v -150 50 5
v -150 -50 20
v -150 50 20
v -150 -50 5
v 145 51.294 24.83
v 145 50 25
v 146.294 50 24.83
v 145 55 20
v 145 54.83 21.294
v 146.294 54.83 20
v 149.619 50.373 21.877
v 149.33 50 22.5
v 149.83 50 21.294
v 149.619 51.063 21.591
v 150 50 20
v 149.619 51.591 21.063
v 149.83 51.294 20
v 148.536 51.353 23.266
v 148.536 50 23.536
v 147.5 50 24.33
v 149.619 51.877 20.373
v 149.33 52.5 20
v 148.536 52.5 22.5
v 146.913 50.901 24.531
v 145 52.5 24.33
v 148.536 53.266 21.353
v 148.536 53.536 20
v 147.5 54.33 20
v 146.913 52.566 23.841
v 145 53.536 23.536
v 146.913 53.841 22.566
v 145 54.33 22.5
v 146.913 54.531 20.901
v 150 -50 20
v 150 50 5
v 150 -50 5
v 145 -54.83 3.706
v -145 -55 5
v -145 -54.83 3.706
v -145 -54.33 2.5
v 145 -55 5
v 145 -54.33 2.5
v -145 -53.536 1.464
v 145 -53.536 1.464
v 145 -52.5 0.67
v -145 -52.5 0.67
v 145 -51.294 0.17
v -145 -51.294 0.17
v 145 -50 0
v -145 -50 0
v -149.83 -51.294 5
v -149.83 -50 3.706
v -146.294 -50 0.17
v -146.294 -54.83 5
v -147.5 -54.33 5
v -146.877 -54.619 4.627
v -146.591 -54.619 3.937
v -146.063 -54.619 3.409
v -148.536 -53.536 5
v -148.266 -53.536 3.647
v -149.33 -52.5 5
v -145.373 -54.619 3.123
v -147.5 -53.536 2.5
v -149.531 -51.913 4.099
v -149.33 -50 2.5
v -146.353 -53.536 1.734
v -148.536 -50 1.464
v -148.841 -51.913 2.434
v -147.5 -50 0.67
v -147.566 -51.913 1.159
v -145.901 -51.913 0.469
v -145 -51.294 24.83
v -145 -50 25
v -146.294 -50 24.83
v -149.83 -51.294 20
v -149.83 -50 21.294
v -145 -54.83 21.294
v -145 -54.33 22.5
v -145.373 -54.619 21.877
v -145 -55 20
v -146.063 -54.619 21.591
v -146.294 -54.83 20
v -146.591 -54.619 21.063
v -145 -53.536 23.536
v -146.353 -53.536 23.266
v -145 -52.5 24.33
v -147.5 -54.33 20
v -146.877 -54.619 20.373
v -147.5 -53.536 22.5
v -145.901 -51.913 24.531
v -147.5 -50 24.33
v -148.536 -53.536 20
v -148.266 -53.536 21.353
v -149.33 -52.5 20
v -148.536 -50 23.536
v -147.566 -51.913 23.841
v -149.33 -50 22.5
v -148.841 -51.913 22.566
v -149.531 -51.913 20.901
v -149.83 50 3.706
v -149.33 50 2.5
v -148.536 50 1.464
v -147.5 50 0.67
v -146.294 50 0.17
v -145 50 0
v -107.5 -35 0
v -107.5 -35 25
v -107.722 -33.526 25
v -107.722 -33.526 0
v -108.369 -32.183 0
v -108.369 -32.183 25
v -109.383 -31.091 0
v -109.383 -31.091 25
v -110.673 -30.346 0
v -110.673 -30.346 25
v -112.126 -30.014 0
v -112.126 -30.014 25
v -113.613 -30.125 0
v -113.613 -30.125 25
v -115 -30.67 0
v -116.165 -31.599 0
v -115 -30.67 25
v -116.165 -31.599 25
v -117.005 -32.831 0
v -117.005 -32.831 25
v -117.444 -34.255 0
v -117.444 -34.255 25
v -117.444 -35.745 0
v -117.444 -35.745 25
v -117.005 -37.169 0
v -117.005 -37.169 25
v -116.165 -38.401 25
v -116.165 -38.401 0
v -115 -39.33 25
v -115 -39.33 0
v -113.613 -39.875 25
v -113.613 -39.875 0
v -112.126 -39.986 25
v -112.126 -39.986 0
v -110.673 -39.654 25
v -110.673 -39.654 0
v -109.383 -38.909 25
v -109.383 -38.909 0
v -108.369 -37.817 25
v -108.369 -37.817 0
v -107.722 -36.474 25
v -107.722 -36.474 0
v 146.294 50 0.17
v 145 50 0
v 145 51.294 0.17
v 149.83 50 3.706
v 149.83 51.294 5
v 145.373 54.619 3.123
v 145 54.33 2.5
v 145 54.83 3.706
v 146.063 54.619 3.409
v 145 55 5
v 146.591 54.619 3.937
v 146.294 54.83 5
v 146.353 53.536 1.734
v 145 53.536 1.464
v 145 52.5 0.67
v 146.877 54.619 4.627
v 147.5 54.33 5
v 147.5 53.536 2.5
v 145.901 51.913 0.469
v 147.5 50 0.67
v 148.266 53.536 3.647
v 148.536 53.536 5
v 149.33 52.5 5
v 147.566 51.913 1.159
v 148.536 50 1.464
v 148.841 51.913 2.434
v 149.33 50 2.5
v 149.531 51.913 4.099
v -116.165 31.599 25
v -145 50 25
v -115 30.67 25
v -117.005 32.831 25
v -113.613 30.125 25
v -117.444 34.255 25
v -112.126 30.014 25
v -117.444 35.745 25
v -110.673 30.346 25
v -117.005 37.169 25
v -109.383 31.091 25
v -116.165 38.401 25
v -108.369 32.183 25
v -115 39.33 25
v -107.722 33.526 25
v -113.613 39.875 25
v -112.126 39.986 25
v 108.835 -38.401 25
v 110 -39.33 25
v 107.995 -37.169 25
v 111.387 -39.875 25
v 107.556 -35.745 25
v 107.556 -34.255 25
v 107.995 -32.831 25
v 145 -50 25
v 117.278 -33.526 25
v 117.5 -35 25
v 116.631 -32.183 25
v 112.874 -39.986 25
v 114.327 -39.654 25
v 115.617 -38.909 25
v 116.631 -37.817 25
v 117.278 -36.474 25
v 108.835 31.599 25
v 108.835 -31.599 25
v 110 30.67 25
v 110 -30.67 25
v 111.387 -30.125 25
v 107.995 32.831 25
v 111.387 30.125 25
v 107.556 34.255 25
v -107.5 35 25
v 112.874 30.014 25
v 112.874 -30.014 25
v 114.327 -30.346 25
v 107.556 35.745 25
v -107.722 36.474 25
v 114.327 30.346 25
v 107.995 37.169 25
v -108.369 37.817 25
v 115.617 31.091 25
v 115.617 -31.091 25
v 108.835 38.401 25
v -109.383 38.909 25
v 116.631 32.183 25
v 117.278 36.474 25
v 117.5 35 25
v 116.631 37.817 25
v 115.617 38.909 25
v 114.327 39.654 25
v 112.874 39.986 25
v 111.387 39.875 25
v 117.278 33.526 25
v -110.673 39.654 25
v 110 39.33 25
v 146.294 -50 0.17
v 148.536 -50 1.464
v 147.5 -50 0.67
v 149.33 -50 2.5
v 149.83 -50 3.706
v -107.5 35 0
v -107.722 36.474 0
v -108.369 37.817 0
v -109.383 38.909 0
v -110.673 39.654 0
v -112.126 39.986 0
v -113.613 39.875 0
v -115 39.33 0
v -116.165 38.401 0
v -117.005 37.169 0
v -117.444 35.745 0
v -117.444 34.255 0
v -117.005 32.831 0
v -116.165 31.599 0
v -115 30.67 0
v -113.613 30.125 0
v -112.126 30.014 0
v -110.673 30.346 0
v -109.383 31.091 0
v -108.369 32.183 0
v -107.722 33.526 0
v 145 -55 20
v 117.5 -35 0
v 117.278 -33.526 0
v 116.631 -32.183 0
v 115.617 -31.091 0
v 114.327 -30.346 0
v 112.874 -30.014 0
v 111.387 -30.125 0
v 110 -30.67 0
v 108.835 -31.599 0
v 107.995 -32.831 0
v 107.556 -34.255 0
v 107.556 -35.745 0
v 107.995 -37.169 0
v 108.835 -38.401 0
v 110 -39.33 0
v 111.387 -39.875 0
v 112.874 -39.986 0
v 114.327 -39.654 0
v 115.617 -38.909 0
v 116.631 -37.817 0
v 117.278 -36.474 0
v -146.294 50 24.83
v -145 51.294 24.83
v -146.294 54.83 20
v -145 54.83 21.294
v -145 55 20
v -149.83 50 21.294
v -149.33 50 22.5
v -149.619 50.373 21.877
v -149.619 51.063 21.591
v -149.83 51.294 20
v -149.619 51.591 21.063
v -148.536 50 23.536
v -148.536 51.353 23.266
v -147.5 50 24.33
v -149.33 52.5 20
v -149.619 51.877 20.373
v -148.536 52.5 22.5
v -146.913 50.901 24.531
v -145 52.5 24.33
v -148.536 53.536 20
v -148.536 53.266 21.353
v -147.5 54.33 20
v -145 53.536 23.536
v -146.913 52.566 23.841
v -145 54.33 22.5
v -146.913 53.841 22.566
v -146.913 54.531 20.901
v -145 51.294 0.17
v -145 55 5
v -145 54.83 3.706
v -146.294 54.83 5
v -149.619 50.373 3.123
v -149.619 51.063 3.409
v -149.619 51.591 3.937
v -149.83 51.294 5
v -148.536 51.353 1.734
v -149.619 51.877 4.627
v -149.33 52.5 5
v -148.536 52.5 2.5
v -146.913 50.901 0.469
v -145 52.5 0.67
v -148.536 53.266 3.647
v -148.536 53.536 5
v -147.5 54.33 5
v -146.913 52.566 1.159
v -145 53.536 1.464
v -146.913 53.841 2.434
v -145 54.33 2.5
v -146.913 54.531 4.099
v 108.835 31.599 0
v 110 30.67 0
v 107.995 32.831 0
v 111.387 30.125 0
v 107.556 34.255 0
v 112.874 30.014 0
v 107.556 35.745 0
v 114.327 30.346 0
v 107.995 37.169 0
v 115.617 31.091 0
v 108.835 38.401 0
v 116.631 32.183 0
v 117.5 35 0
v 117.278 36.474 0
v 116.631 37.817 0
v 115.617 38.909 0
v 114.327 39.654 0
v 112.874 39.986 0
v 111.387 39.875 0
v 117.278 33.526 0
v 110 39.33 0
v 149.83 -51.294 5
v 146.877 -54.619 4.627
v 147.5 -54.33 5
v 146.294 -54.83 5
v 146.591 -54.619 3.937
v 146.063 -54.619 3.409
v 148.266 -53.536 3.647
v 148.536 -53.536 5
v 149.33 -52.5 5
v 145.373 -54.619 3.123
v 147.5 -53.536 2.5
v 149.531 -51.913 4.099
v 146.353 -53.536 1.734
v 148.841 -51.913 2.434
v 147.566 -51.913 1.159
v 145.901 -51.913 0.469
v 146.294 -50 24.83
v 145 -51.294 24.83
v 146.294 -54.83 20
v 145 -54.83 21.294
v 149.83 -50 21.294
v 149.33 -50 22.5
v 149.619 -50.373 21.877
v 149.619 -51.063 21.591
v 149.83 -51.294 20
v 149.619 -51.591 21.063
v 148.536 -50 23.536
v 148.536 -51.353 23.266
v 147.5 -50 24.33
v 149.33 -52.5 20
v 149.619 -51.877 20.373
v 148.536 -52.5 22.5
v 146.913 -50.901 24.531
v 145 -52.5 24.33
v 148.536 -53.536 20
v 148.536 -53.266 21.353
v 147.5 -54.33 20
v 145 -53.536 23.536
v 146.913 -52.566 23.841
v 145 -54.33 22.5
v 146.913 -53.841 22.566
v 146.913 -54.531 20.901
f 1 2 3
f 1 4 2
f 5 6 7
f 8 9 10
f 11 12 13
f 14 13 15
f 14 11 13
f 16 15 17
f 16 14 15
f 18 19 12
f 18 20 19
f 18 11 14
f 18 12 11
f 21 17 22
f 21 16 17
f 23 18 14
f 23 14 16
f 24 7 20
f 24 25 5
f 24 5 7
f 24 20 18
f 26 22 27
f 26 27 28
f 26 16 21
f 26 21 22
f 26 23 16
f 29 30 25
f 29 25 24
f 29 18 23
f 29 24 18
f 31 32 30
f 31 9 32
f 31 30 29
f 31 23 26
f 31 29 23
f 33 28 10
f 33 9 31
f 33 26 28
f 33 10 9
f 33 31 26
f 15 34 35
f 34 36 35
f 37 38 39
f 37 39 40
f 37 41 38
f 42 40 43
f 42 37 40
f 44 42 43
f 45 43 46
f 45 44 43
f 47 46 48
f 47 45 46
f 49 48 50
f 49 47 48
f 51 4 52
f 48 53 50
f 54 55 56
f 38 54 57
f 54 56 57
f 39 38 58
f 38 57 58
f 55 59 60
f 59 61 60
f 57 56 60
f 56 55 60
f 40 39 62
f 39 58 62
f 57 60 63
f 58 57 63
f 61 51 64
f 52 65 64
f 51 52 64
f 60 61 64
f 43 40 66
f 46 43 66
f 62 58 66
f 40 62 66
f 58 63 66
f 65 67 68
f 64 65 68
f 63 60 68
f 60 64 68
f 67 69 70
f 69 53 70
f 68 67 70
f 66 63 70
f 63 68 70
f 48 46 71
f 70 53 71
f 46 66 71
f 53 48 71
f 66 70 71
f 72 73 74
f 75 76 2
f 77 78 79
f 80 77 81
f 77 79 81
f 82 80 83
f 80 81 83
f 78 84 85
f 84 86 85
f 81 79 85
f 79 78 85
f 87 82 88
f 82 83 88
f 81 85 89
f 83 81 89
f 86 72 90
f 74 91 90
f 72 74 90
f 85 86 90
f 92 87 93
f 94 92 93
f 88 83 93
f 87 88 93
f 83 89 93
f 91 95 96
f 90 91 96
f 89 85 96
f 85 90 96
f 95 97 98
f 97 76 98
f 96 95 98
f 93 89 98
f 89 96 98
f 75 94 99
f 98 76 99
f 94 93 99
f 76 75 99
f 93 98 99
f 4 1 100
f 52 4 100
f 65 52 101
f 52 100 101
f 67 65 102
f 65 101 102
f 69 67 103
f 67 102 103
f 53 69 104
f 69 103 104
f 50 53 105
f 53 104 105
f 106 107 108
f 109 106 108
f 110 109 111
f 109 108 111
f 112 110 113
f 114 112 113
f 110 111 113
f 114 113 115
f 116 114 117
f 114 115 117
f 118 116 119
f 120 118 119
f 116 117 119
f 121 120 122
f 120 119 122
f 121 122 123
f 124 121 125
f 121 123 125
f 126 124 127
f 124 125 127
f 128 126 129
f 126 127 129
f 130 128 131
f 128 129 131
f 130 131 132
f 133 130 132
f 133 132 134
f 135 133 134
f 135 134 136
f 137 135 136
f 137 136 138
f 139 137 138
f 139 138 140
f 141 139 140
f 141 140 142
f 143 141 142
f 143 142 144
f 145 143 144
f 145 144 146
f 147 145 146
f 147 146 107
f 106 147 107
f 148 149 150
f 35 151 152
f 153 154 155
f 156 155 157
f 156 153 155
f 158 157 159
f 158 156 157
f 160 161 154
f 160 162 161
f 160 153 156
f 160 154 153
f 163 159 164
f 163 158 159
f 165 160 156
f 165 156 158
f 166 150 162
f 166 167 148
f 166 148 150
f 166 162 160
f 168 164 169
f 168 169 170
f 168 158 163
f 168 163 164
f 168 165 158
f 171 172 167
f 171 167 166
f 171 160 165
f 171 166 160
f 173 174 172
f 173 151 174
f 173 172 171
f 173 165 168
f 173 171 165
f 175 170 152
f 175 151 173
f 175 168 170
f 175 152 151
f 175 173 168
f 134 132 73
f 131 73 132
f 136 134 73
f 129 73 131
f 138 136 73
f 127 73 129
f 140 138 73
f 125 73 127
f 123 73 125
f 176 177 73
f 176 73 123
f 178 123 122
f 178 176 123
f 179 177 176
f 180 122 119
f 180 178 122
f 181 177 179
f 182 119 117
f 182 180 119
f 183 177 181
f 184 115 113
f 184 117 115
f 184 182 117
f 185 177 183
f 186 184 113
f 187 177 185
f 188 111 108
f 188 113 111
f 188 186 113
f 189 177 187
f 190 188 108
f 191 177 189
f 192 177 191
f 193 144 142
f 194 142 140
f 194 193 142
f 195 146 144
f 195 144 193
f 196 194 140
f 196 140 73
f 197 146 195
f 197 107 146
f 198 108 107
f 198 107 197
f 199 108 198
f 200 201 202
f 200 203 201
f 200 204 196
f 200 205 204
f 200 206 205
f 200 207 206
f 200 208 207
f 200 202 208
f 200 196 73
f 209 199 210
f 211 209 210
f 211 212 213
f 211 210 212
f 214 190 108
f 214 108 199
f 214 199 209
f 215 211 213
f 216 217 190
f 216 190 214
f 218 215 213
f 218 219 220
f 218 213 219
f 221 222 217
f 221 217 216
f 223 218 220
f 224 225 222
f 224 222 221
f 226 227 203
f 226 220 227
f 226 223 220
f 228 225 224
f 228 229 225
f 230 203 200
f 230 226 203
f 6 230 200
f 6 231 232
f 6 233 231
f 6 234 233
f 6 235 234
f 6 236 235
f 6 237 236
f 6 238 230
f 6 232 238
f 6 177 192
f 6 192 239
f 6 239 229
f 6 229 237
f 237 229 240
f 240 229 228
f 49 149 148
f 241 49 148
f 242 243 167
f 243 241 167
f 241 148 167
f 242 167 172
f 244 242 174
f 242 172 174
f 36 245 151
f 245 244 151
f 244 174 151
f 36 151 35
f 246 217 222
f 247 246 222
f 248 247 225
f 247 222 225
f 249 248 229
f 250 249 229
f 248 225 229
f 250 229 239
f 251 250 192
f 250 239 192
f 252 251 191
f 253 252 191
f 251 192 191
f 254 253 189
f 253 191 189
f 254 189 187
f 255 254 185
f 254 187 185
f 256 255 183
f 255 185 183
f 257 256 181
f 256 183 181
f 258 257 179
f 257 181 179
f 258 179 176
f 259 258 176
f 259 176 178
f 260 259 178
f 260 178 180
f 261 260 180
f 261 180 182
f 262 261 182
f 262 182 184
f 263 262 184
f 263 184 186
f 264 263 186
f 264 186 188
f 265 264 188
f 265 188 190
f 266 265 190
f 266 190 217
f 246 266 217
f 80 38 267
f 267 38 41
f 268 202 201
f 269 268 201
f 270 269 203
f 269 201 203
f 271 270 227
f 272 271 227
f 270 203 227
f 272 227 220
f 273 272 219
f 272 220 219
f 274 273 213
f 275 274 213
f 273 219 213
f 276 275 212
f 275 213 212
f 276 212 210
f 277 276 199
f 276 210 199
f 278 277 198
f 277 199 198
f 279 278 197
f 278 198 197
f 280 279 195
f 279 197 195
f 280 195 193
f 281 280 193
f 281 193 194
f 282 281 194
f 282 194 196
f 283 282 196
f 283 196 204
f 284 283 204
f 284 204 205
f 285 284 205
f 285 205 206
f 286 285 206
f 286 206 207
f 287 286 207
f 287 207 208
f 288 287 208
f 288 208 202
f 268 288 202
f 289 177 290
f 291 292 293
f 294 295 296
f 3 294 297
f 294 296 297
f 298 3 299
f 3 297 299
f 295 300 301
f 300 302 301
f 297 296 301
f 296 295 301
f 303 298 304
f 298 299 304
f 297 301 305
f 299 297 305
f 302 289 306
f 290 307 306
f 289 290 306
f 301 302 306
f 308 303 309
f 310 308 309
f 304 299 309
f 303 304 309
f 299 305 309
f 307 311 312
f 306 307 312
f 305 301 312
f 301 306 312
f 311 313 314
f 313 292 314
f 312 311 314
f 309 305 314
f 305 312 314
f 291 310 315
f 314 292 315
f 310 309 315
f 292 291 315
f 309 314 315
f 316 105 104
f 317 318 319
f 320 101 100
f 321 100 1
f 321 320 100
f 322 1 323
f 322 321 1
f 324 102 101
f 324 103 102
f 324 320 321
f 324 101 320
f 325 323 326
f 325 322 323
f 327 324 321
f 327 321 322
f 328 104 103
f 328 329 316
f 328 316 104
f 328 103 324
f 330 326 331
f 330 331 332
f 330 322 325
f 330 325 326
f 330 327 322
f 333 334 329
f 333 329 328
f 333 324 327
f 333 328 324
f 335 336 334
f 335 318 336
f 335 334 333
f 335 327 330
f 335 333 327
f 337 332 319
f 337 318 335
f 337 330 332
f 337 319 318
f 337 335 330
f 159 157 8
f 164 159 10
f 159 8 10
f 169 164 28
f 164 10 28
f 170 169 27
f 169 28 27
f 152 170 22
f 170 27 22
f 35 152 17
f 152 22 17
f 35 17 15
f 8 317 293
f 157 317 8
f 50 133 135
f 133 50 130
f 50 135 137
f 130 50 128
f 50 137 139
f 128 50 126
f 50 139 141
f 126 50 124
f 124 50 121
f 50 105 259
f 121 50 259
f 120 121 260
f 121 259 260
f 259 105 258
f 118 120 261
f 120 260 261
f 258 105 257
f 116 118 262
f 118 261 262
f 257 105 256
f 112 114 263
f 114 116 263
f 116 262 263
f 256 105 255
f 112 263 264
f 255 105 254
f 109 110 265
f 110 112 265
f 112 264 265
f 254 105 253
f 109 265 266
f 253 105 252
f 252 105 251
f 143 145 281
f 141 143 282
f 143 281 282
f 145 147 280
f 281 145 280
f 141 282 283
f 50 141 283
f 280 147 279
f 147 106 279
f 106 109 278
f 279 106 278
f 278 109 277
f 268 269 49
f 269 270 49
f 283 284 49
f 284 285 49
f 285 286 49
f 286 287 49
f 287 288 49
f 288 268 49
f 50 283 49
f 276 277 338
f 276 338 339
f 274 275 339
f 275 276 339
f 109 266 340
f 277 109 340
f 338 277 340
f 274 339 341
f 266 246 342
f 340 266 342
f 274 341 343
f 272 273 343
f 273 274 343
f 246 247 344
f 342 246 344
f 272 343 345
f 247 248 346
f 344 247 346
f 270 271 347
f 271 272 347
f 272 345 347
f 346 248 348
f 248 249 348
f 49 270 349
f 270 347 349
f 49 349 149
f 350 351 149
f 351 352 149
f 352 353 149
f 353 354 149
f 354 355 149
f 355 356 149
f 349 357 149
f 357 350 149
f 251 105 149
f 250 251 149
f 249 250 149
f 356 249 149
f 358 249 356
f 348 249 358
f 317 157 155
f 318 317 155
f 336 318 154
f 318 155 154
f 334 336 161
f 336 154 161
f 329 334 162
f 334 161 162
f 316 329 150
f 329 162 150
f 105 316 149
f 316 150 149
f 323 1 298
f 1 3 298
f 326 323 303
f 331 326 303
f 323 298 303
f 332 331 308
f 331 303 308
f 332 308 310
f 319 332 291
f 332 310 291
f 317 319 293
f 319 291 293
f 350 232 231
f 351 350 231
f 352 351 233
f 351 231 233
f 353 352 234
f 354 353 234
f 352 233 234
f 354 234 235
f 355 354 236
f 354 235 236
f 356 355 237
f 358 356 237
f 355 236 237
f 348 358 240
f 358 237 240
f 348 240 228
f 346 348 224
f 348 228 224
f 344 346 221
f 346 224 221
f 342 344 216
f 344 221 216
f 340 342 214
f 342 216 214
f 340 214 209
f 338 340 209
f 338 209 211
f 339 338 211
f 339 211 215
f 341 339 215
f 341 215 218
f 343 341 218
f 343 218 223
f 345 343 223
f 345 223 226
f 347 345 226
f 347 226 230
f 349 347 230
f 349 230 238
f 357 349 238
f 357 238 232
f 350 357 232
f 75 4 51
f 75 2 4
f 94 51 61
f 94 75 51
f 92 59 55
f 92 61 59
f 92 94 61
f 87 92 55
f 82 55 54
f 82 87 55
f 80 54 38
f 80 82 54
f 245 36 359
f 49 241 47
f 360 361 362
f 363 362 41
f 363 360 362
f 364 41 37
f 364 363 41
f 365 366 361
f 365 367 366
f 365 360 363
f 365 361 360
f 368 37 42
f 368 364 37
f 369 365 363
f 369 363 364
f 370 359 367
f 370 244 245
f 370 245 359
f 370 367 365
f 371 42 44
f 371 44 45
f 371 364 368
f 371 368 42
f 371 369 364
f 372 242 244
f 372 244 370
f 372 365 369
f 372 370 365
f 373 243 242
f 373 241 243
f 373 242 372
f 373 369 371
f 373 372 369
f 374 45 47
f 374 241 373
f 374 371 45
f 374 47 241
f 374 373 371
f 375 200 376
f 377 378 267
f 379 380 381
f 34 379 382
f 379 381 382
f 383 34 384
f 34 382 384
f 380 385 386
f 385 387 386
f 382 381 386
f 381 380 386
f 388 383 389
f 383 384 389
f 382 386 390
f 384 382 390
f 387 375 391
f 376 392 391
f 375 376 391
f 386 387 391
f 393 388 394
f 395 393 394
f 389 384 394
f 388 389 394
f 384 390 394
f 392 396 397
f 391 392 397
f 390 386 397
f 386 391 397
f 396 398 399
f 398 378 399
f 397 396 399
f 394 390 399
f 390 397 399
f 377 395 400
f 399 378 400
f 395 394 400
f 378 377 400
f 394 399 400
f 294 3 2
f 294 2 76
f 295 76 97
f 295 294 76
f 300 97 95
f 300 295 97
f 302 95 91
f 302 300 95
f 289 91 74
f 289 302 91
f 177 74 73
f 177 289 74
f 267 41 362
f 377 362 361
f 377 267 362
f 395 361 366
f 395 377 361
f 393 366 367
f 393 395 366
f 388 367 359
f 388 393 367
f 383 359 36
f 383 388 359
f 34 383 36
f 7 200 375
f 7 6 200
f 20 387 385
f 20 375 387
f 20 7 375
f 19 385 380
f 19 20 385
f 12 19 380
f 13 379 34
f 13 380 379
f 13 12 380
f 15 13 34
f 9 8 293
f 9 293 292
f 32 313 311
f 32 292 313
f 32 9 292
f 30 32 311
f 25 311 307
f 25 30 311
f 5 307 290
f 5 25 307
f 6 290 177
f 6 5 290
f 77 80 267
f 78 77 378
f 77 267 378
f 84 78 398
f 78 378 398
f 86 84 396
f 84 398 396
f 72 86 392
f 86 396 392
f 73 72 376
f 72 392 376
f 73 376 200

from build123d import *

# Parameters (mm, degrees)
F0_W     = 300
F0_H     = 110
F1_DEPTH = 25
F2_R     = 5
F3_DEPTH = 25.001
F4_R     = 5


with BuildPart() as f1:
    # F0 (on Top) → F1 (new body)
    with BuildSketch(Plane.XY):
        Rectangle(F0_W, F0_H)
    extrude(amount=F1_DEPTH)

    # F2 (on face) → F3 (cut, through all)
    with BuildSketch(Plane.XY.offset(25)):
        with Locations((-112.5, 35)):
            Circle(F2_R)
        with Locations((-112.5, -35)):
            Circle(F2_R)
        with Locations((112.5, -35)):
            Circle(F2_R)
        with Locations((112.5, 35)):
            Circle(F2_R)
    extrude(amount=-F3_DEPTH, mode=Mode.SUBTRACT)

    # F4
    f4_edges = [f1.edges().sort_by_distance(p)[0] for p in [
        (0, 55, 25),
        (-150, 0, 25),
        (0, -55, 25),
        (150, 0, 25),
        (150, 0, 0),
        (0, 55, 0),
        (-150, 0, 0),
        (-150, -55, 12.5),
        (-150, 55, 12.5),
        (150, 55, 12.5),
        (150, -55, 12.5),
        (0, -55, 0),
    ]]
    fillet(f4_edges, radius=F4_R)


solid = f1.part
